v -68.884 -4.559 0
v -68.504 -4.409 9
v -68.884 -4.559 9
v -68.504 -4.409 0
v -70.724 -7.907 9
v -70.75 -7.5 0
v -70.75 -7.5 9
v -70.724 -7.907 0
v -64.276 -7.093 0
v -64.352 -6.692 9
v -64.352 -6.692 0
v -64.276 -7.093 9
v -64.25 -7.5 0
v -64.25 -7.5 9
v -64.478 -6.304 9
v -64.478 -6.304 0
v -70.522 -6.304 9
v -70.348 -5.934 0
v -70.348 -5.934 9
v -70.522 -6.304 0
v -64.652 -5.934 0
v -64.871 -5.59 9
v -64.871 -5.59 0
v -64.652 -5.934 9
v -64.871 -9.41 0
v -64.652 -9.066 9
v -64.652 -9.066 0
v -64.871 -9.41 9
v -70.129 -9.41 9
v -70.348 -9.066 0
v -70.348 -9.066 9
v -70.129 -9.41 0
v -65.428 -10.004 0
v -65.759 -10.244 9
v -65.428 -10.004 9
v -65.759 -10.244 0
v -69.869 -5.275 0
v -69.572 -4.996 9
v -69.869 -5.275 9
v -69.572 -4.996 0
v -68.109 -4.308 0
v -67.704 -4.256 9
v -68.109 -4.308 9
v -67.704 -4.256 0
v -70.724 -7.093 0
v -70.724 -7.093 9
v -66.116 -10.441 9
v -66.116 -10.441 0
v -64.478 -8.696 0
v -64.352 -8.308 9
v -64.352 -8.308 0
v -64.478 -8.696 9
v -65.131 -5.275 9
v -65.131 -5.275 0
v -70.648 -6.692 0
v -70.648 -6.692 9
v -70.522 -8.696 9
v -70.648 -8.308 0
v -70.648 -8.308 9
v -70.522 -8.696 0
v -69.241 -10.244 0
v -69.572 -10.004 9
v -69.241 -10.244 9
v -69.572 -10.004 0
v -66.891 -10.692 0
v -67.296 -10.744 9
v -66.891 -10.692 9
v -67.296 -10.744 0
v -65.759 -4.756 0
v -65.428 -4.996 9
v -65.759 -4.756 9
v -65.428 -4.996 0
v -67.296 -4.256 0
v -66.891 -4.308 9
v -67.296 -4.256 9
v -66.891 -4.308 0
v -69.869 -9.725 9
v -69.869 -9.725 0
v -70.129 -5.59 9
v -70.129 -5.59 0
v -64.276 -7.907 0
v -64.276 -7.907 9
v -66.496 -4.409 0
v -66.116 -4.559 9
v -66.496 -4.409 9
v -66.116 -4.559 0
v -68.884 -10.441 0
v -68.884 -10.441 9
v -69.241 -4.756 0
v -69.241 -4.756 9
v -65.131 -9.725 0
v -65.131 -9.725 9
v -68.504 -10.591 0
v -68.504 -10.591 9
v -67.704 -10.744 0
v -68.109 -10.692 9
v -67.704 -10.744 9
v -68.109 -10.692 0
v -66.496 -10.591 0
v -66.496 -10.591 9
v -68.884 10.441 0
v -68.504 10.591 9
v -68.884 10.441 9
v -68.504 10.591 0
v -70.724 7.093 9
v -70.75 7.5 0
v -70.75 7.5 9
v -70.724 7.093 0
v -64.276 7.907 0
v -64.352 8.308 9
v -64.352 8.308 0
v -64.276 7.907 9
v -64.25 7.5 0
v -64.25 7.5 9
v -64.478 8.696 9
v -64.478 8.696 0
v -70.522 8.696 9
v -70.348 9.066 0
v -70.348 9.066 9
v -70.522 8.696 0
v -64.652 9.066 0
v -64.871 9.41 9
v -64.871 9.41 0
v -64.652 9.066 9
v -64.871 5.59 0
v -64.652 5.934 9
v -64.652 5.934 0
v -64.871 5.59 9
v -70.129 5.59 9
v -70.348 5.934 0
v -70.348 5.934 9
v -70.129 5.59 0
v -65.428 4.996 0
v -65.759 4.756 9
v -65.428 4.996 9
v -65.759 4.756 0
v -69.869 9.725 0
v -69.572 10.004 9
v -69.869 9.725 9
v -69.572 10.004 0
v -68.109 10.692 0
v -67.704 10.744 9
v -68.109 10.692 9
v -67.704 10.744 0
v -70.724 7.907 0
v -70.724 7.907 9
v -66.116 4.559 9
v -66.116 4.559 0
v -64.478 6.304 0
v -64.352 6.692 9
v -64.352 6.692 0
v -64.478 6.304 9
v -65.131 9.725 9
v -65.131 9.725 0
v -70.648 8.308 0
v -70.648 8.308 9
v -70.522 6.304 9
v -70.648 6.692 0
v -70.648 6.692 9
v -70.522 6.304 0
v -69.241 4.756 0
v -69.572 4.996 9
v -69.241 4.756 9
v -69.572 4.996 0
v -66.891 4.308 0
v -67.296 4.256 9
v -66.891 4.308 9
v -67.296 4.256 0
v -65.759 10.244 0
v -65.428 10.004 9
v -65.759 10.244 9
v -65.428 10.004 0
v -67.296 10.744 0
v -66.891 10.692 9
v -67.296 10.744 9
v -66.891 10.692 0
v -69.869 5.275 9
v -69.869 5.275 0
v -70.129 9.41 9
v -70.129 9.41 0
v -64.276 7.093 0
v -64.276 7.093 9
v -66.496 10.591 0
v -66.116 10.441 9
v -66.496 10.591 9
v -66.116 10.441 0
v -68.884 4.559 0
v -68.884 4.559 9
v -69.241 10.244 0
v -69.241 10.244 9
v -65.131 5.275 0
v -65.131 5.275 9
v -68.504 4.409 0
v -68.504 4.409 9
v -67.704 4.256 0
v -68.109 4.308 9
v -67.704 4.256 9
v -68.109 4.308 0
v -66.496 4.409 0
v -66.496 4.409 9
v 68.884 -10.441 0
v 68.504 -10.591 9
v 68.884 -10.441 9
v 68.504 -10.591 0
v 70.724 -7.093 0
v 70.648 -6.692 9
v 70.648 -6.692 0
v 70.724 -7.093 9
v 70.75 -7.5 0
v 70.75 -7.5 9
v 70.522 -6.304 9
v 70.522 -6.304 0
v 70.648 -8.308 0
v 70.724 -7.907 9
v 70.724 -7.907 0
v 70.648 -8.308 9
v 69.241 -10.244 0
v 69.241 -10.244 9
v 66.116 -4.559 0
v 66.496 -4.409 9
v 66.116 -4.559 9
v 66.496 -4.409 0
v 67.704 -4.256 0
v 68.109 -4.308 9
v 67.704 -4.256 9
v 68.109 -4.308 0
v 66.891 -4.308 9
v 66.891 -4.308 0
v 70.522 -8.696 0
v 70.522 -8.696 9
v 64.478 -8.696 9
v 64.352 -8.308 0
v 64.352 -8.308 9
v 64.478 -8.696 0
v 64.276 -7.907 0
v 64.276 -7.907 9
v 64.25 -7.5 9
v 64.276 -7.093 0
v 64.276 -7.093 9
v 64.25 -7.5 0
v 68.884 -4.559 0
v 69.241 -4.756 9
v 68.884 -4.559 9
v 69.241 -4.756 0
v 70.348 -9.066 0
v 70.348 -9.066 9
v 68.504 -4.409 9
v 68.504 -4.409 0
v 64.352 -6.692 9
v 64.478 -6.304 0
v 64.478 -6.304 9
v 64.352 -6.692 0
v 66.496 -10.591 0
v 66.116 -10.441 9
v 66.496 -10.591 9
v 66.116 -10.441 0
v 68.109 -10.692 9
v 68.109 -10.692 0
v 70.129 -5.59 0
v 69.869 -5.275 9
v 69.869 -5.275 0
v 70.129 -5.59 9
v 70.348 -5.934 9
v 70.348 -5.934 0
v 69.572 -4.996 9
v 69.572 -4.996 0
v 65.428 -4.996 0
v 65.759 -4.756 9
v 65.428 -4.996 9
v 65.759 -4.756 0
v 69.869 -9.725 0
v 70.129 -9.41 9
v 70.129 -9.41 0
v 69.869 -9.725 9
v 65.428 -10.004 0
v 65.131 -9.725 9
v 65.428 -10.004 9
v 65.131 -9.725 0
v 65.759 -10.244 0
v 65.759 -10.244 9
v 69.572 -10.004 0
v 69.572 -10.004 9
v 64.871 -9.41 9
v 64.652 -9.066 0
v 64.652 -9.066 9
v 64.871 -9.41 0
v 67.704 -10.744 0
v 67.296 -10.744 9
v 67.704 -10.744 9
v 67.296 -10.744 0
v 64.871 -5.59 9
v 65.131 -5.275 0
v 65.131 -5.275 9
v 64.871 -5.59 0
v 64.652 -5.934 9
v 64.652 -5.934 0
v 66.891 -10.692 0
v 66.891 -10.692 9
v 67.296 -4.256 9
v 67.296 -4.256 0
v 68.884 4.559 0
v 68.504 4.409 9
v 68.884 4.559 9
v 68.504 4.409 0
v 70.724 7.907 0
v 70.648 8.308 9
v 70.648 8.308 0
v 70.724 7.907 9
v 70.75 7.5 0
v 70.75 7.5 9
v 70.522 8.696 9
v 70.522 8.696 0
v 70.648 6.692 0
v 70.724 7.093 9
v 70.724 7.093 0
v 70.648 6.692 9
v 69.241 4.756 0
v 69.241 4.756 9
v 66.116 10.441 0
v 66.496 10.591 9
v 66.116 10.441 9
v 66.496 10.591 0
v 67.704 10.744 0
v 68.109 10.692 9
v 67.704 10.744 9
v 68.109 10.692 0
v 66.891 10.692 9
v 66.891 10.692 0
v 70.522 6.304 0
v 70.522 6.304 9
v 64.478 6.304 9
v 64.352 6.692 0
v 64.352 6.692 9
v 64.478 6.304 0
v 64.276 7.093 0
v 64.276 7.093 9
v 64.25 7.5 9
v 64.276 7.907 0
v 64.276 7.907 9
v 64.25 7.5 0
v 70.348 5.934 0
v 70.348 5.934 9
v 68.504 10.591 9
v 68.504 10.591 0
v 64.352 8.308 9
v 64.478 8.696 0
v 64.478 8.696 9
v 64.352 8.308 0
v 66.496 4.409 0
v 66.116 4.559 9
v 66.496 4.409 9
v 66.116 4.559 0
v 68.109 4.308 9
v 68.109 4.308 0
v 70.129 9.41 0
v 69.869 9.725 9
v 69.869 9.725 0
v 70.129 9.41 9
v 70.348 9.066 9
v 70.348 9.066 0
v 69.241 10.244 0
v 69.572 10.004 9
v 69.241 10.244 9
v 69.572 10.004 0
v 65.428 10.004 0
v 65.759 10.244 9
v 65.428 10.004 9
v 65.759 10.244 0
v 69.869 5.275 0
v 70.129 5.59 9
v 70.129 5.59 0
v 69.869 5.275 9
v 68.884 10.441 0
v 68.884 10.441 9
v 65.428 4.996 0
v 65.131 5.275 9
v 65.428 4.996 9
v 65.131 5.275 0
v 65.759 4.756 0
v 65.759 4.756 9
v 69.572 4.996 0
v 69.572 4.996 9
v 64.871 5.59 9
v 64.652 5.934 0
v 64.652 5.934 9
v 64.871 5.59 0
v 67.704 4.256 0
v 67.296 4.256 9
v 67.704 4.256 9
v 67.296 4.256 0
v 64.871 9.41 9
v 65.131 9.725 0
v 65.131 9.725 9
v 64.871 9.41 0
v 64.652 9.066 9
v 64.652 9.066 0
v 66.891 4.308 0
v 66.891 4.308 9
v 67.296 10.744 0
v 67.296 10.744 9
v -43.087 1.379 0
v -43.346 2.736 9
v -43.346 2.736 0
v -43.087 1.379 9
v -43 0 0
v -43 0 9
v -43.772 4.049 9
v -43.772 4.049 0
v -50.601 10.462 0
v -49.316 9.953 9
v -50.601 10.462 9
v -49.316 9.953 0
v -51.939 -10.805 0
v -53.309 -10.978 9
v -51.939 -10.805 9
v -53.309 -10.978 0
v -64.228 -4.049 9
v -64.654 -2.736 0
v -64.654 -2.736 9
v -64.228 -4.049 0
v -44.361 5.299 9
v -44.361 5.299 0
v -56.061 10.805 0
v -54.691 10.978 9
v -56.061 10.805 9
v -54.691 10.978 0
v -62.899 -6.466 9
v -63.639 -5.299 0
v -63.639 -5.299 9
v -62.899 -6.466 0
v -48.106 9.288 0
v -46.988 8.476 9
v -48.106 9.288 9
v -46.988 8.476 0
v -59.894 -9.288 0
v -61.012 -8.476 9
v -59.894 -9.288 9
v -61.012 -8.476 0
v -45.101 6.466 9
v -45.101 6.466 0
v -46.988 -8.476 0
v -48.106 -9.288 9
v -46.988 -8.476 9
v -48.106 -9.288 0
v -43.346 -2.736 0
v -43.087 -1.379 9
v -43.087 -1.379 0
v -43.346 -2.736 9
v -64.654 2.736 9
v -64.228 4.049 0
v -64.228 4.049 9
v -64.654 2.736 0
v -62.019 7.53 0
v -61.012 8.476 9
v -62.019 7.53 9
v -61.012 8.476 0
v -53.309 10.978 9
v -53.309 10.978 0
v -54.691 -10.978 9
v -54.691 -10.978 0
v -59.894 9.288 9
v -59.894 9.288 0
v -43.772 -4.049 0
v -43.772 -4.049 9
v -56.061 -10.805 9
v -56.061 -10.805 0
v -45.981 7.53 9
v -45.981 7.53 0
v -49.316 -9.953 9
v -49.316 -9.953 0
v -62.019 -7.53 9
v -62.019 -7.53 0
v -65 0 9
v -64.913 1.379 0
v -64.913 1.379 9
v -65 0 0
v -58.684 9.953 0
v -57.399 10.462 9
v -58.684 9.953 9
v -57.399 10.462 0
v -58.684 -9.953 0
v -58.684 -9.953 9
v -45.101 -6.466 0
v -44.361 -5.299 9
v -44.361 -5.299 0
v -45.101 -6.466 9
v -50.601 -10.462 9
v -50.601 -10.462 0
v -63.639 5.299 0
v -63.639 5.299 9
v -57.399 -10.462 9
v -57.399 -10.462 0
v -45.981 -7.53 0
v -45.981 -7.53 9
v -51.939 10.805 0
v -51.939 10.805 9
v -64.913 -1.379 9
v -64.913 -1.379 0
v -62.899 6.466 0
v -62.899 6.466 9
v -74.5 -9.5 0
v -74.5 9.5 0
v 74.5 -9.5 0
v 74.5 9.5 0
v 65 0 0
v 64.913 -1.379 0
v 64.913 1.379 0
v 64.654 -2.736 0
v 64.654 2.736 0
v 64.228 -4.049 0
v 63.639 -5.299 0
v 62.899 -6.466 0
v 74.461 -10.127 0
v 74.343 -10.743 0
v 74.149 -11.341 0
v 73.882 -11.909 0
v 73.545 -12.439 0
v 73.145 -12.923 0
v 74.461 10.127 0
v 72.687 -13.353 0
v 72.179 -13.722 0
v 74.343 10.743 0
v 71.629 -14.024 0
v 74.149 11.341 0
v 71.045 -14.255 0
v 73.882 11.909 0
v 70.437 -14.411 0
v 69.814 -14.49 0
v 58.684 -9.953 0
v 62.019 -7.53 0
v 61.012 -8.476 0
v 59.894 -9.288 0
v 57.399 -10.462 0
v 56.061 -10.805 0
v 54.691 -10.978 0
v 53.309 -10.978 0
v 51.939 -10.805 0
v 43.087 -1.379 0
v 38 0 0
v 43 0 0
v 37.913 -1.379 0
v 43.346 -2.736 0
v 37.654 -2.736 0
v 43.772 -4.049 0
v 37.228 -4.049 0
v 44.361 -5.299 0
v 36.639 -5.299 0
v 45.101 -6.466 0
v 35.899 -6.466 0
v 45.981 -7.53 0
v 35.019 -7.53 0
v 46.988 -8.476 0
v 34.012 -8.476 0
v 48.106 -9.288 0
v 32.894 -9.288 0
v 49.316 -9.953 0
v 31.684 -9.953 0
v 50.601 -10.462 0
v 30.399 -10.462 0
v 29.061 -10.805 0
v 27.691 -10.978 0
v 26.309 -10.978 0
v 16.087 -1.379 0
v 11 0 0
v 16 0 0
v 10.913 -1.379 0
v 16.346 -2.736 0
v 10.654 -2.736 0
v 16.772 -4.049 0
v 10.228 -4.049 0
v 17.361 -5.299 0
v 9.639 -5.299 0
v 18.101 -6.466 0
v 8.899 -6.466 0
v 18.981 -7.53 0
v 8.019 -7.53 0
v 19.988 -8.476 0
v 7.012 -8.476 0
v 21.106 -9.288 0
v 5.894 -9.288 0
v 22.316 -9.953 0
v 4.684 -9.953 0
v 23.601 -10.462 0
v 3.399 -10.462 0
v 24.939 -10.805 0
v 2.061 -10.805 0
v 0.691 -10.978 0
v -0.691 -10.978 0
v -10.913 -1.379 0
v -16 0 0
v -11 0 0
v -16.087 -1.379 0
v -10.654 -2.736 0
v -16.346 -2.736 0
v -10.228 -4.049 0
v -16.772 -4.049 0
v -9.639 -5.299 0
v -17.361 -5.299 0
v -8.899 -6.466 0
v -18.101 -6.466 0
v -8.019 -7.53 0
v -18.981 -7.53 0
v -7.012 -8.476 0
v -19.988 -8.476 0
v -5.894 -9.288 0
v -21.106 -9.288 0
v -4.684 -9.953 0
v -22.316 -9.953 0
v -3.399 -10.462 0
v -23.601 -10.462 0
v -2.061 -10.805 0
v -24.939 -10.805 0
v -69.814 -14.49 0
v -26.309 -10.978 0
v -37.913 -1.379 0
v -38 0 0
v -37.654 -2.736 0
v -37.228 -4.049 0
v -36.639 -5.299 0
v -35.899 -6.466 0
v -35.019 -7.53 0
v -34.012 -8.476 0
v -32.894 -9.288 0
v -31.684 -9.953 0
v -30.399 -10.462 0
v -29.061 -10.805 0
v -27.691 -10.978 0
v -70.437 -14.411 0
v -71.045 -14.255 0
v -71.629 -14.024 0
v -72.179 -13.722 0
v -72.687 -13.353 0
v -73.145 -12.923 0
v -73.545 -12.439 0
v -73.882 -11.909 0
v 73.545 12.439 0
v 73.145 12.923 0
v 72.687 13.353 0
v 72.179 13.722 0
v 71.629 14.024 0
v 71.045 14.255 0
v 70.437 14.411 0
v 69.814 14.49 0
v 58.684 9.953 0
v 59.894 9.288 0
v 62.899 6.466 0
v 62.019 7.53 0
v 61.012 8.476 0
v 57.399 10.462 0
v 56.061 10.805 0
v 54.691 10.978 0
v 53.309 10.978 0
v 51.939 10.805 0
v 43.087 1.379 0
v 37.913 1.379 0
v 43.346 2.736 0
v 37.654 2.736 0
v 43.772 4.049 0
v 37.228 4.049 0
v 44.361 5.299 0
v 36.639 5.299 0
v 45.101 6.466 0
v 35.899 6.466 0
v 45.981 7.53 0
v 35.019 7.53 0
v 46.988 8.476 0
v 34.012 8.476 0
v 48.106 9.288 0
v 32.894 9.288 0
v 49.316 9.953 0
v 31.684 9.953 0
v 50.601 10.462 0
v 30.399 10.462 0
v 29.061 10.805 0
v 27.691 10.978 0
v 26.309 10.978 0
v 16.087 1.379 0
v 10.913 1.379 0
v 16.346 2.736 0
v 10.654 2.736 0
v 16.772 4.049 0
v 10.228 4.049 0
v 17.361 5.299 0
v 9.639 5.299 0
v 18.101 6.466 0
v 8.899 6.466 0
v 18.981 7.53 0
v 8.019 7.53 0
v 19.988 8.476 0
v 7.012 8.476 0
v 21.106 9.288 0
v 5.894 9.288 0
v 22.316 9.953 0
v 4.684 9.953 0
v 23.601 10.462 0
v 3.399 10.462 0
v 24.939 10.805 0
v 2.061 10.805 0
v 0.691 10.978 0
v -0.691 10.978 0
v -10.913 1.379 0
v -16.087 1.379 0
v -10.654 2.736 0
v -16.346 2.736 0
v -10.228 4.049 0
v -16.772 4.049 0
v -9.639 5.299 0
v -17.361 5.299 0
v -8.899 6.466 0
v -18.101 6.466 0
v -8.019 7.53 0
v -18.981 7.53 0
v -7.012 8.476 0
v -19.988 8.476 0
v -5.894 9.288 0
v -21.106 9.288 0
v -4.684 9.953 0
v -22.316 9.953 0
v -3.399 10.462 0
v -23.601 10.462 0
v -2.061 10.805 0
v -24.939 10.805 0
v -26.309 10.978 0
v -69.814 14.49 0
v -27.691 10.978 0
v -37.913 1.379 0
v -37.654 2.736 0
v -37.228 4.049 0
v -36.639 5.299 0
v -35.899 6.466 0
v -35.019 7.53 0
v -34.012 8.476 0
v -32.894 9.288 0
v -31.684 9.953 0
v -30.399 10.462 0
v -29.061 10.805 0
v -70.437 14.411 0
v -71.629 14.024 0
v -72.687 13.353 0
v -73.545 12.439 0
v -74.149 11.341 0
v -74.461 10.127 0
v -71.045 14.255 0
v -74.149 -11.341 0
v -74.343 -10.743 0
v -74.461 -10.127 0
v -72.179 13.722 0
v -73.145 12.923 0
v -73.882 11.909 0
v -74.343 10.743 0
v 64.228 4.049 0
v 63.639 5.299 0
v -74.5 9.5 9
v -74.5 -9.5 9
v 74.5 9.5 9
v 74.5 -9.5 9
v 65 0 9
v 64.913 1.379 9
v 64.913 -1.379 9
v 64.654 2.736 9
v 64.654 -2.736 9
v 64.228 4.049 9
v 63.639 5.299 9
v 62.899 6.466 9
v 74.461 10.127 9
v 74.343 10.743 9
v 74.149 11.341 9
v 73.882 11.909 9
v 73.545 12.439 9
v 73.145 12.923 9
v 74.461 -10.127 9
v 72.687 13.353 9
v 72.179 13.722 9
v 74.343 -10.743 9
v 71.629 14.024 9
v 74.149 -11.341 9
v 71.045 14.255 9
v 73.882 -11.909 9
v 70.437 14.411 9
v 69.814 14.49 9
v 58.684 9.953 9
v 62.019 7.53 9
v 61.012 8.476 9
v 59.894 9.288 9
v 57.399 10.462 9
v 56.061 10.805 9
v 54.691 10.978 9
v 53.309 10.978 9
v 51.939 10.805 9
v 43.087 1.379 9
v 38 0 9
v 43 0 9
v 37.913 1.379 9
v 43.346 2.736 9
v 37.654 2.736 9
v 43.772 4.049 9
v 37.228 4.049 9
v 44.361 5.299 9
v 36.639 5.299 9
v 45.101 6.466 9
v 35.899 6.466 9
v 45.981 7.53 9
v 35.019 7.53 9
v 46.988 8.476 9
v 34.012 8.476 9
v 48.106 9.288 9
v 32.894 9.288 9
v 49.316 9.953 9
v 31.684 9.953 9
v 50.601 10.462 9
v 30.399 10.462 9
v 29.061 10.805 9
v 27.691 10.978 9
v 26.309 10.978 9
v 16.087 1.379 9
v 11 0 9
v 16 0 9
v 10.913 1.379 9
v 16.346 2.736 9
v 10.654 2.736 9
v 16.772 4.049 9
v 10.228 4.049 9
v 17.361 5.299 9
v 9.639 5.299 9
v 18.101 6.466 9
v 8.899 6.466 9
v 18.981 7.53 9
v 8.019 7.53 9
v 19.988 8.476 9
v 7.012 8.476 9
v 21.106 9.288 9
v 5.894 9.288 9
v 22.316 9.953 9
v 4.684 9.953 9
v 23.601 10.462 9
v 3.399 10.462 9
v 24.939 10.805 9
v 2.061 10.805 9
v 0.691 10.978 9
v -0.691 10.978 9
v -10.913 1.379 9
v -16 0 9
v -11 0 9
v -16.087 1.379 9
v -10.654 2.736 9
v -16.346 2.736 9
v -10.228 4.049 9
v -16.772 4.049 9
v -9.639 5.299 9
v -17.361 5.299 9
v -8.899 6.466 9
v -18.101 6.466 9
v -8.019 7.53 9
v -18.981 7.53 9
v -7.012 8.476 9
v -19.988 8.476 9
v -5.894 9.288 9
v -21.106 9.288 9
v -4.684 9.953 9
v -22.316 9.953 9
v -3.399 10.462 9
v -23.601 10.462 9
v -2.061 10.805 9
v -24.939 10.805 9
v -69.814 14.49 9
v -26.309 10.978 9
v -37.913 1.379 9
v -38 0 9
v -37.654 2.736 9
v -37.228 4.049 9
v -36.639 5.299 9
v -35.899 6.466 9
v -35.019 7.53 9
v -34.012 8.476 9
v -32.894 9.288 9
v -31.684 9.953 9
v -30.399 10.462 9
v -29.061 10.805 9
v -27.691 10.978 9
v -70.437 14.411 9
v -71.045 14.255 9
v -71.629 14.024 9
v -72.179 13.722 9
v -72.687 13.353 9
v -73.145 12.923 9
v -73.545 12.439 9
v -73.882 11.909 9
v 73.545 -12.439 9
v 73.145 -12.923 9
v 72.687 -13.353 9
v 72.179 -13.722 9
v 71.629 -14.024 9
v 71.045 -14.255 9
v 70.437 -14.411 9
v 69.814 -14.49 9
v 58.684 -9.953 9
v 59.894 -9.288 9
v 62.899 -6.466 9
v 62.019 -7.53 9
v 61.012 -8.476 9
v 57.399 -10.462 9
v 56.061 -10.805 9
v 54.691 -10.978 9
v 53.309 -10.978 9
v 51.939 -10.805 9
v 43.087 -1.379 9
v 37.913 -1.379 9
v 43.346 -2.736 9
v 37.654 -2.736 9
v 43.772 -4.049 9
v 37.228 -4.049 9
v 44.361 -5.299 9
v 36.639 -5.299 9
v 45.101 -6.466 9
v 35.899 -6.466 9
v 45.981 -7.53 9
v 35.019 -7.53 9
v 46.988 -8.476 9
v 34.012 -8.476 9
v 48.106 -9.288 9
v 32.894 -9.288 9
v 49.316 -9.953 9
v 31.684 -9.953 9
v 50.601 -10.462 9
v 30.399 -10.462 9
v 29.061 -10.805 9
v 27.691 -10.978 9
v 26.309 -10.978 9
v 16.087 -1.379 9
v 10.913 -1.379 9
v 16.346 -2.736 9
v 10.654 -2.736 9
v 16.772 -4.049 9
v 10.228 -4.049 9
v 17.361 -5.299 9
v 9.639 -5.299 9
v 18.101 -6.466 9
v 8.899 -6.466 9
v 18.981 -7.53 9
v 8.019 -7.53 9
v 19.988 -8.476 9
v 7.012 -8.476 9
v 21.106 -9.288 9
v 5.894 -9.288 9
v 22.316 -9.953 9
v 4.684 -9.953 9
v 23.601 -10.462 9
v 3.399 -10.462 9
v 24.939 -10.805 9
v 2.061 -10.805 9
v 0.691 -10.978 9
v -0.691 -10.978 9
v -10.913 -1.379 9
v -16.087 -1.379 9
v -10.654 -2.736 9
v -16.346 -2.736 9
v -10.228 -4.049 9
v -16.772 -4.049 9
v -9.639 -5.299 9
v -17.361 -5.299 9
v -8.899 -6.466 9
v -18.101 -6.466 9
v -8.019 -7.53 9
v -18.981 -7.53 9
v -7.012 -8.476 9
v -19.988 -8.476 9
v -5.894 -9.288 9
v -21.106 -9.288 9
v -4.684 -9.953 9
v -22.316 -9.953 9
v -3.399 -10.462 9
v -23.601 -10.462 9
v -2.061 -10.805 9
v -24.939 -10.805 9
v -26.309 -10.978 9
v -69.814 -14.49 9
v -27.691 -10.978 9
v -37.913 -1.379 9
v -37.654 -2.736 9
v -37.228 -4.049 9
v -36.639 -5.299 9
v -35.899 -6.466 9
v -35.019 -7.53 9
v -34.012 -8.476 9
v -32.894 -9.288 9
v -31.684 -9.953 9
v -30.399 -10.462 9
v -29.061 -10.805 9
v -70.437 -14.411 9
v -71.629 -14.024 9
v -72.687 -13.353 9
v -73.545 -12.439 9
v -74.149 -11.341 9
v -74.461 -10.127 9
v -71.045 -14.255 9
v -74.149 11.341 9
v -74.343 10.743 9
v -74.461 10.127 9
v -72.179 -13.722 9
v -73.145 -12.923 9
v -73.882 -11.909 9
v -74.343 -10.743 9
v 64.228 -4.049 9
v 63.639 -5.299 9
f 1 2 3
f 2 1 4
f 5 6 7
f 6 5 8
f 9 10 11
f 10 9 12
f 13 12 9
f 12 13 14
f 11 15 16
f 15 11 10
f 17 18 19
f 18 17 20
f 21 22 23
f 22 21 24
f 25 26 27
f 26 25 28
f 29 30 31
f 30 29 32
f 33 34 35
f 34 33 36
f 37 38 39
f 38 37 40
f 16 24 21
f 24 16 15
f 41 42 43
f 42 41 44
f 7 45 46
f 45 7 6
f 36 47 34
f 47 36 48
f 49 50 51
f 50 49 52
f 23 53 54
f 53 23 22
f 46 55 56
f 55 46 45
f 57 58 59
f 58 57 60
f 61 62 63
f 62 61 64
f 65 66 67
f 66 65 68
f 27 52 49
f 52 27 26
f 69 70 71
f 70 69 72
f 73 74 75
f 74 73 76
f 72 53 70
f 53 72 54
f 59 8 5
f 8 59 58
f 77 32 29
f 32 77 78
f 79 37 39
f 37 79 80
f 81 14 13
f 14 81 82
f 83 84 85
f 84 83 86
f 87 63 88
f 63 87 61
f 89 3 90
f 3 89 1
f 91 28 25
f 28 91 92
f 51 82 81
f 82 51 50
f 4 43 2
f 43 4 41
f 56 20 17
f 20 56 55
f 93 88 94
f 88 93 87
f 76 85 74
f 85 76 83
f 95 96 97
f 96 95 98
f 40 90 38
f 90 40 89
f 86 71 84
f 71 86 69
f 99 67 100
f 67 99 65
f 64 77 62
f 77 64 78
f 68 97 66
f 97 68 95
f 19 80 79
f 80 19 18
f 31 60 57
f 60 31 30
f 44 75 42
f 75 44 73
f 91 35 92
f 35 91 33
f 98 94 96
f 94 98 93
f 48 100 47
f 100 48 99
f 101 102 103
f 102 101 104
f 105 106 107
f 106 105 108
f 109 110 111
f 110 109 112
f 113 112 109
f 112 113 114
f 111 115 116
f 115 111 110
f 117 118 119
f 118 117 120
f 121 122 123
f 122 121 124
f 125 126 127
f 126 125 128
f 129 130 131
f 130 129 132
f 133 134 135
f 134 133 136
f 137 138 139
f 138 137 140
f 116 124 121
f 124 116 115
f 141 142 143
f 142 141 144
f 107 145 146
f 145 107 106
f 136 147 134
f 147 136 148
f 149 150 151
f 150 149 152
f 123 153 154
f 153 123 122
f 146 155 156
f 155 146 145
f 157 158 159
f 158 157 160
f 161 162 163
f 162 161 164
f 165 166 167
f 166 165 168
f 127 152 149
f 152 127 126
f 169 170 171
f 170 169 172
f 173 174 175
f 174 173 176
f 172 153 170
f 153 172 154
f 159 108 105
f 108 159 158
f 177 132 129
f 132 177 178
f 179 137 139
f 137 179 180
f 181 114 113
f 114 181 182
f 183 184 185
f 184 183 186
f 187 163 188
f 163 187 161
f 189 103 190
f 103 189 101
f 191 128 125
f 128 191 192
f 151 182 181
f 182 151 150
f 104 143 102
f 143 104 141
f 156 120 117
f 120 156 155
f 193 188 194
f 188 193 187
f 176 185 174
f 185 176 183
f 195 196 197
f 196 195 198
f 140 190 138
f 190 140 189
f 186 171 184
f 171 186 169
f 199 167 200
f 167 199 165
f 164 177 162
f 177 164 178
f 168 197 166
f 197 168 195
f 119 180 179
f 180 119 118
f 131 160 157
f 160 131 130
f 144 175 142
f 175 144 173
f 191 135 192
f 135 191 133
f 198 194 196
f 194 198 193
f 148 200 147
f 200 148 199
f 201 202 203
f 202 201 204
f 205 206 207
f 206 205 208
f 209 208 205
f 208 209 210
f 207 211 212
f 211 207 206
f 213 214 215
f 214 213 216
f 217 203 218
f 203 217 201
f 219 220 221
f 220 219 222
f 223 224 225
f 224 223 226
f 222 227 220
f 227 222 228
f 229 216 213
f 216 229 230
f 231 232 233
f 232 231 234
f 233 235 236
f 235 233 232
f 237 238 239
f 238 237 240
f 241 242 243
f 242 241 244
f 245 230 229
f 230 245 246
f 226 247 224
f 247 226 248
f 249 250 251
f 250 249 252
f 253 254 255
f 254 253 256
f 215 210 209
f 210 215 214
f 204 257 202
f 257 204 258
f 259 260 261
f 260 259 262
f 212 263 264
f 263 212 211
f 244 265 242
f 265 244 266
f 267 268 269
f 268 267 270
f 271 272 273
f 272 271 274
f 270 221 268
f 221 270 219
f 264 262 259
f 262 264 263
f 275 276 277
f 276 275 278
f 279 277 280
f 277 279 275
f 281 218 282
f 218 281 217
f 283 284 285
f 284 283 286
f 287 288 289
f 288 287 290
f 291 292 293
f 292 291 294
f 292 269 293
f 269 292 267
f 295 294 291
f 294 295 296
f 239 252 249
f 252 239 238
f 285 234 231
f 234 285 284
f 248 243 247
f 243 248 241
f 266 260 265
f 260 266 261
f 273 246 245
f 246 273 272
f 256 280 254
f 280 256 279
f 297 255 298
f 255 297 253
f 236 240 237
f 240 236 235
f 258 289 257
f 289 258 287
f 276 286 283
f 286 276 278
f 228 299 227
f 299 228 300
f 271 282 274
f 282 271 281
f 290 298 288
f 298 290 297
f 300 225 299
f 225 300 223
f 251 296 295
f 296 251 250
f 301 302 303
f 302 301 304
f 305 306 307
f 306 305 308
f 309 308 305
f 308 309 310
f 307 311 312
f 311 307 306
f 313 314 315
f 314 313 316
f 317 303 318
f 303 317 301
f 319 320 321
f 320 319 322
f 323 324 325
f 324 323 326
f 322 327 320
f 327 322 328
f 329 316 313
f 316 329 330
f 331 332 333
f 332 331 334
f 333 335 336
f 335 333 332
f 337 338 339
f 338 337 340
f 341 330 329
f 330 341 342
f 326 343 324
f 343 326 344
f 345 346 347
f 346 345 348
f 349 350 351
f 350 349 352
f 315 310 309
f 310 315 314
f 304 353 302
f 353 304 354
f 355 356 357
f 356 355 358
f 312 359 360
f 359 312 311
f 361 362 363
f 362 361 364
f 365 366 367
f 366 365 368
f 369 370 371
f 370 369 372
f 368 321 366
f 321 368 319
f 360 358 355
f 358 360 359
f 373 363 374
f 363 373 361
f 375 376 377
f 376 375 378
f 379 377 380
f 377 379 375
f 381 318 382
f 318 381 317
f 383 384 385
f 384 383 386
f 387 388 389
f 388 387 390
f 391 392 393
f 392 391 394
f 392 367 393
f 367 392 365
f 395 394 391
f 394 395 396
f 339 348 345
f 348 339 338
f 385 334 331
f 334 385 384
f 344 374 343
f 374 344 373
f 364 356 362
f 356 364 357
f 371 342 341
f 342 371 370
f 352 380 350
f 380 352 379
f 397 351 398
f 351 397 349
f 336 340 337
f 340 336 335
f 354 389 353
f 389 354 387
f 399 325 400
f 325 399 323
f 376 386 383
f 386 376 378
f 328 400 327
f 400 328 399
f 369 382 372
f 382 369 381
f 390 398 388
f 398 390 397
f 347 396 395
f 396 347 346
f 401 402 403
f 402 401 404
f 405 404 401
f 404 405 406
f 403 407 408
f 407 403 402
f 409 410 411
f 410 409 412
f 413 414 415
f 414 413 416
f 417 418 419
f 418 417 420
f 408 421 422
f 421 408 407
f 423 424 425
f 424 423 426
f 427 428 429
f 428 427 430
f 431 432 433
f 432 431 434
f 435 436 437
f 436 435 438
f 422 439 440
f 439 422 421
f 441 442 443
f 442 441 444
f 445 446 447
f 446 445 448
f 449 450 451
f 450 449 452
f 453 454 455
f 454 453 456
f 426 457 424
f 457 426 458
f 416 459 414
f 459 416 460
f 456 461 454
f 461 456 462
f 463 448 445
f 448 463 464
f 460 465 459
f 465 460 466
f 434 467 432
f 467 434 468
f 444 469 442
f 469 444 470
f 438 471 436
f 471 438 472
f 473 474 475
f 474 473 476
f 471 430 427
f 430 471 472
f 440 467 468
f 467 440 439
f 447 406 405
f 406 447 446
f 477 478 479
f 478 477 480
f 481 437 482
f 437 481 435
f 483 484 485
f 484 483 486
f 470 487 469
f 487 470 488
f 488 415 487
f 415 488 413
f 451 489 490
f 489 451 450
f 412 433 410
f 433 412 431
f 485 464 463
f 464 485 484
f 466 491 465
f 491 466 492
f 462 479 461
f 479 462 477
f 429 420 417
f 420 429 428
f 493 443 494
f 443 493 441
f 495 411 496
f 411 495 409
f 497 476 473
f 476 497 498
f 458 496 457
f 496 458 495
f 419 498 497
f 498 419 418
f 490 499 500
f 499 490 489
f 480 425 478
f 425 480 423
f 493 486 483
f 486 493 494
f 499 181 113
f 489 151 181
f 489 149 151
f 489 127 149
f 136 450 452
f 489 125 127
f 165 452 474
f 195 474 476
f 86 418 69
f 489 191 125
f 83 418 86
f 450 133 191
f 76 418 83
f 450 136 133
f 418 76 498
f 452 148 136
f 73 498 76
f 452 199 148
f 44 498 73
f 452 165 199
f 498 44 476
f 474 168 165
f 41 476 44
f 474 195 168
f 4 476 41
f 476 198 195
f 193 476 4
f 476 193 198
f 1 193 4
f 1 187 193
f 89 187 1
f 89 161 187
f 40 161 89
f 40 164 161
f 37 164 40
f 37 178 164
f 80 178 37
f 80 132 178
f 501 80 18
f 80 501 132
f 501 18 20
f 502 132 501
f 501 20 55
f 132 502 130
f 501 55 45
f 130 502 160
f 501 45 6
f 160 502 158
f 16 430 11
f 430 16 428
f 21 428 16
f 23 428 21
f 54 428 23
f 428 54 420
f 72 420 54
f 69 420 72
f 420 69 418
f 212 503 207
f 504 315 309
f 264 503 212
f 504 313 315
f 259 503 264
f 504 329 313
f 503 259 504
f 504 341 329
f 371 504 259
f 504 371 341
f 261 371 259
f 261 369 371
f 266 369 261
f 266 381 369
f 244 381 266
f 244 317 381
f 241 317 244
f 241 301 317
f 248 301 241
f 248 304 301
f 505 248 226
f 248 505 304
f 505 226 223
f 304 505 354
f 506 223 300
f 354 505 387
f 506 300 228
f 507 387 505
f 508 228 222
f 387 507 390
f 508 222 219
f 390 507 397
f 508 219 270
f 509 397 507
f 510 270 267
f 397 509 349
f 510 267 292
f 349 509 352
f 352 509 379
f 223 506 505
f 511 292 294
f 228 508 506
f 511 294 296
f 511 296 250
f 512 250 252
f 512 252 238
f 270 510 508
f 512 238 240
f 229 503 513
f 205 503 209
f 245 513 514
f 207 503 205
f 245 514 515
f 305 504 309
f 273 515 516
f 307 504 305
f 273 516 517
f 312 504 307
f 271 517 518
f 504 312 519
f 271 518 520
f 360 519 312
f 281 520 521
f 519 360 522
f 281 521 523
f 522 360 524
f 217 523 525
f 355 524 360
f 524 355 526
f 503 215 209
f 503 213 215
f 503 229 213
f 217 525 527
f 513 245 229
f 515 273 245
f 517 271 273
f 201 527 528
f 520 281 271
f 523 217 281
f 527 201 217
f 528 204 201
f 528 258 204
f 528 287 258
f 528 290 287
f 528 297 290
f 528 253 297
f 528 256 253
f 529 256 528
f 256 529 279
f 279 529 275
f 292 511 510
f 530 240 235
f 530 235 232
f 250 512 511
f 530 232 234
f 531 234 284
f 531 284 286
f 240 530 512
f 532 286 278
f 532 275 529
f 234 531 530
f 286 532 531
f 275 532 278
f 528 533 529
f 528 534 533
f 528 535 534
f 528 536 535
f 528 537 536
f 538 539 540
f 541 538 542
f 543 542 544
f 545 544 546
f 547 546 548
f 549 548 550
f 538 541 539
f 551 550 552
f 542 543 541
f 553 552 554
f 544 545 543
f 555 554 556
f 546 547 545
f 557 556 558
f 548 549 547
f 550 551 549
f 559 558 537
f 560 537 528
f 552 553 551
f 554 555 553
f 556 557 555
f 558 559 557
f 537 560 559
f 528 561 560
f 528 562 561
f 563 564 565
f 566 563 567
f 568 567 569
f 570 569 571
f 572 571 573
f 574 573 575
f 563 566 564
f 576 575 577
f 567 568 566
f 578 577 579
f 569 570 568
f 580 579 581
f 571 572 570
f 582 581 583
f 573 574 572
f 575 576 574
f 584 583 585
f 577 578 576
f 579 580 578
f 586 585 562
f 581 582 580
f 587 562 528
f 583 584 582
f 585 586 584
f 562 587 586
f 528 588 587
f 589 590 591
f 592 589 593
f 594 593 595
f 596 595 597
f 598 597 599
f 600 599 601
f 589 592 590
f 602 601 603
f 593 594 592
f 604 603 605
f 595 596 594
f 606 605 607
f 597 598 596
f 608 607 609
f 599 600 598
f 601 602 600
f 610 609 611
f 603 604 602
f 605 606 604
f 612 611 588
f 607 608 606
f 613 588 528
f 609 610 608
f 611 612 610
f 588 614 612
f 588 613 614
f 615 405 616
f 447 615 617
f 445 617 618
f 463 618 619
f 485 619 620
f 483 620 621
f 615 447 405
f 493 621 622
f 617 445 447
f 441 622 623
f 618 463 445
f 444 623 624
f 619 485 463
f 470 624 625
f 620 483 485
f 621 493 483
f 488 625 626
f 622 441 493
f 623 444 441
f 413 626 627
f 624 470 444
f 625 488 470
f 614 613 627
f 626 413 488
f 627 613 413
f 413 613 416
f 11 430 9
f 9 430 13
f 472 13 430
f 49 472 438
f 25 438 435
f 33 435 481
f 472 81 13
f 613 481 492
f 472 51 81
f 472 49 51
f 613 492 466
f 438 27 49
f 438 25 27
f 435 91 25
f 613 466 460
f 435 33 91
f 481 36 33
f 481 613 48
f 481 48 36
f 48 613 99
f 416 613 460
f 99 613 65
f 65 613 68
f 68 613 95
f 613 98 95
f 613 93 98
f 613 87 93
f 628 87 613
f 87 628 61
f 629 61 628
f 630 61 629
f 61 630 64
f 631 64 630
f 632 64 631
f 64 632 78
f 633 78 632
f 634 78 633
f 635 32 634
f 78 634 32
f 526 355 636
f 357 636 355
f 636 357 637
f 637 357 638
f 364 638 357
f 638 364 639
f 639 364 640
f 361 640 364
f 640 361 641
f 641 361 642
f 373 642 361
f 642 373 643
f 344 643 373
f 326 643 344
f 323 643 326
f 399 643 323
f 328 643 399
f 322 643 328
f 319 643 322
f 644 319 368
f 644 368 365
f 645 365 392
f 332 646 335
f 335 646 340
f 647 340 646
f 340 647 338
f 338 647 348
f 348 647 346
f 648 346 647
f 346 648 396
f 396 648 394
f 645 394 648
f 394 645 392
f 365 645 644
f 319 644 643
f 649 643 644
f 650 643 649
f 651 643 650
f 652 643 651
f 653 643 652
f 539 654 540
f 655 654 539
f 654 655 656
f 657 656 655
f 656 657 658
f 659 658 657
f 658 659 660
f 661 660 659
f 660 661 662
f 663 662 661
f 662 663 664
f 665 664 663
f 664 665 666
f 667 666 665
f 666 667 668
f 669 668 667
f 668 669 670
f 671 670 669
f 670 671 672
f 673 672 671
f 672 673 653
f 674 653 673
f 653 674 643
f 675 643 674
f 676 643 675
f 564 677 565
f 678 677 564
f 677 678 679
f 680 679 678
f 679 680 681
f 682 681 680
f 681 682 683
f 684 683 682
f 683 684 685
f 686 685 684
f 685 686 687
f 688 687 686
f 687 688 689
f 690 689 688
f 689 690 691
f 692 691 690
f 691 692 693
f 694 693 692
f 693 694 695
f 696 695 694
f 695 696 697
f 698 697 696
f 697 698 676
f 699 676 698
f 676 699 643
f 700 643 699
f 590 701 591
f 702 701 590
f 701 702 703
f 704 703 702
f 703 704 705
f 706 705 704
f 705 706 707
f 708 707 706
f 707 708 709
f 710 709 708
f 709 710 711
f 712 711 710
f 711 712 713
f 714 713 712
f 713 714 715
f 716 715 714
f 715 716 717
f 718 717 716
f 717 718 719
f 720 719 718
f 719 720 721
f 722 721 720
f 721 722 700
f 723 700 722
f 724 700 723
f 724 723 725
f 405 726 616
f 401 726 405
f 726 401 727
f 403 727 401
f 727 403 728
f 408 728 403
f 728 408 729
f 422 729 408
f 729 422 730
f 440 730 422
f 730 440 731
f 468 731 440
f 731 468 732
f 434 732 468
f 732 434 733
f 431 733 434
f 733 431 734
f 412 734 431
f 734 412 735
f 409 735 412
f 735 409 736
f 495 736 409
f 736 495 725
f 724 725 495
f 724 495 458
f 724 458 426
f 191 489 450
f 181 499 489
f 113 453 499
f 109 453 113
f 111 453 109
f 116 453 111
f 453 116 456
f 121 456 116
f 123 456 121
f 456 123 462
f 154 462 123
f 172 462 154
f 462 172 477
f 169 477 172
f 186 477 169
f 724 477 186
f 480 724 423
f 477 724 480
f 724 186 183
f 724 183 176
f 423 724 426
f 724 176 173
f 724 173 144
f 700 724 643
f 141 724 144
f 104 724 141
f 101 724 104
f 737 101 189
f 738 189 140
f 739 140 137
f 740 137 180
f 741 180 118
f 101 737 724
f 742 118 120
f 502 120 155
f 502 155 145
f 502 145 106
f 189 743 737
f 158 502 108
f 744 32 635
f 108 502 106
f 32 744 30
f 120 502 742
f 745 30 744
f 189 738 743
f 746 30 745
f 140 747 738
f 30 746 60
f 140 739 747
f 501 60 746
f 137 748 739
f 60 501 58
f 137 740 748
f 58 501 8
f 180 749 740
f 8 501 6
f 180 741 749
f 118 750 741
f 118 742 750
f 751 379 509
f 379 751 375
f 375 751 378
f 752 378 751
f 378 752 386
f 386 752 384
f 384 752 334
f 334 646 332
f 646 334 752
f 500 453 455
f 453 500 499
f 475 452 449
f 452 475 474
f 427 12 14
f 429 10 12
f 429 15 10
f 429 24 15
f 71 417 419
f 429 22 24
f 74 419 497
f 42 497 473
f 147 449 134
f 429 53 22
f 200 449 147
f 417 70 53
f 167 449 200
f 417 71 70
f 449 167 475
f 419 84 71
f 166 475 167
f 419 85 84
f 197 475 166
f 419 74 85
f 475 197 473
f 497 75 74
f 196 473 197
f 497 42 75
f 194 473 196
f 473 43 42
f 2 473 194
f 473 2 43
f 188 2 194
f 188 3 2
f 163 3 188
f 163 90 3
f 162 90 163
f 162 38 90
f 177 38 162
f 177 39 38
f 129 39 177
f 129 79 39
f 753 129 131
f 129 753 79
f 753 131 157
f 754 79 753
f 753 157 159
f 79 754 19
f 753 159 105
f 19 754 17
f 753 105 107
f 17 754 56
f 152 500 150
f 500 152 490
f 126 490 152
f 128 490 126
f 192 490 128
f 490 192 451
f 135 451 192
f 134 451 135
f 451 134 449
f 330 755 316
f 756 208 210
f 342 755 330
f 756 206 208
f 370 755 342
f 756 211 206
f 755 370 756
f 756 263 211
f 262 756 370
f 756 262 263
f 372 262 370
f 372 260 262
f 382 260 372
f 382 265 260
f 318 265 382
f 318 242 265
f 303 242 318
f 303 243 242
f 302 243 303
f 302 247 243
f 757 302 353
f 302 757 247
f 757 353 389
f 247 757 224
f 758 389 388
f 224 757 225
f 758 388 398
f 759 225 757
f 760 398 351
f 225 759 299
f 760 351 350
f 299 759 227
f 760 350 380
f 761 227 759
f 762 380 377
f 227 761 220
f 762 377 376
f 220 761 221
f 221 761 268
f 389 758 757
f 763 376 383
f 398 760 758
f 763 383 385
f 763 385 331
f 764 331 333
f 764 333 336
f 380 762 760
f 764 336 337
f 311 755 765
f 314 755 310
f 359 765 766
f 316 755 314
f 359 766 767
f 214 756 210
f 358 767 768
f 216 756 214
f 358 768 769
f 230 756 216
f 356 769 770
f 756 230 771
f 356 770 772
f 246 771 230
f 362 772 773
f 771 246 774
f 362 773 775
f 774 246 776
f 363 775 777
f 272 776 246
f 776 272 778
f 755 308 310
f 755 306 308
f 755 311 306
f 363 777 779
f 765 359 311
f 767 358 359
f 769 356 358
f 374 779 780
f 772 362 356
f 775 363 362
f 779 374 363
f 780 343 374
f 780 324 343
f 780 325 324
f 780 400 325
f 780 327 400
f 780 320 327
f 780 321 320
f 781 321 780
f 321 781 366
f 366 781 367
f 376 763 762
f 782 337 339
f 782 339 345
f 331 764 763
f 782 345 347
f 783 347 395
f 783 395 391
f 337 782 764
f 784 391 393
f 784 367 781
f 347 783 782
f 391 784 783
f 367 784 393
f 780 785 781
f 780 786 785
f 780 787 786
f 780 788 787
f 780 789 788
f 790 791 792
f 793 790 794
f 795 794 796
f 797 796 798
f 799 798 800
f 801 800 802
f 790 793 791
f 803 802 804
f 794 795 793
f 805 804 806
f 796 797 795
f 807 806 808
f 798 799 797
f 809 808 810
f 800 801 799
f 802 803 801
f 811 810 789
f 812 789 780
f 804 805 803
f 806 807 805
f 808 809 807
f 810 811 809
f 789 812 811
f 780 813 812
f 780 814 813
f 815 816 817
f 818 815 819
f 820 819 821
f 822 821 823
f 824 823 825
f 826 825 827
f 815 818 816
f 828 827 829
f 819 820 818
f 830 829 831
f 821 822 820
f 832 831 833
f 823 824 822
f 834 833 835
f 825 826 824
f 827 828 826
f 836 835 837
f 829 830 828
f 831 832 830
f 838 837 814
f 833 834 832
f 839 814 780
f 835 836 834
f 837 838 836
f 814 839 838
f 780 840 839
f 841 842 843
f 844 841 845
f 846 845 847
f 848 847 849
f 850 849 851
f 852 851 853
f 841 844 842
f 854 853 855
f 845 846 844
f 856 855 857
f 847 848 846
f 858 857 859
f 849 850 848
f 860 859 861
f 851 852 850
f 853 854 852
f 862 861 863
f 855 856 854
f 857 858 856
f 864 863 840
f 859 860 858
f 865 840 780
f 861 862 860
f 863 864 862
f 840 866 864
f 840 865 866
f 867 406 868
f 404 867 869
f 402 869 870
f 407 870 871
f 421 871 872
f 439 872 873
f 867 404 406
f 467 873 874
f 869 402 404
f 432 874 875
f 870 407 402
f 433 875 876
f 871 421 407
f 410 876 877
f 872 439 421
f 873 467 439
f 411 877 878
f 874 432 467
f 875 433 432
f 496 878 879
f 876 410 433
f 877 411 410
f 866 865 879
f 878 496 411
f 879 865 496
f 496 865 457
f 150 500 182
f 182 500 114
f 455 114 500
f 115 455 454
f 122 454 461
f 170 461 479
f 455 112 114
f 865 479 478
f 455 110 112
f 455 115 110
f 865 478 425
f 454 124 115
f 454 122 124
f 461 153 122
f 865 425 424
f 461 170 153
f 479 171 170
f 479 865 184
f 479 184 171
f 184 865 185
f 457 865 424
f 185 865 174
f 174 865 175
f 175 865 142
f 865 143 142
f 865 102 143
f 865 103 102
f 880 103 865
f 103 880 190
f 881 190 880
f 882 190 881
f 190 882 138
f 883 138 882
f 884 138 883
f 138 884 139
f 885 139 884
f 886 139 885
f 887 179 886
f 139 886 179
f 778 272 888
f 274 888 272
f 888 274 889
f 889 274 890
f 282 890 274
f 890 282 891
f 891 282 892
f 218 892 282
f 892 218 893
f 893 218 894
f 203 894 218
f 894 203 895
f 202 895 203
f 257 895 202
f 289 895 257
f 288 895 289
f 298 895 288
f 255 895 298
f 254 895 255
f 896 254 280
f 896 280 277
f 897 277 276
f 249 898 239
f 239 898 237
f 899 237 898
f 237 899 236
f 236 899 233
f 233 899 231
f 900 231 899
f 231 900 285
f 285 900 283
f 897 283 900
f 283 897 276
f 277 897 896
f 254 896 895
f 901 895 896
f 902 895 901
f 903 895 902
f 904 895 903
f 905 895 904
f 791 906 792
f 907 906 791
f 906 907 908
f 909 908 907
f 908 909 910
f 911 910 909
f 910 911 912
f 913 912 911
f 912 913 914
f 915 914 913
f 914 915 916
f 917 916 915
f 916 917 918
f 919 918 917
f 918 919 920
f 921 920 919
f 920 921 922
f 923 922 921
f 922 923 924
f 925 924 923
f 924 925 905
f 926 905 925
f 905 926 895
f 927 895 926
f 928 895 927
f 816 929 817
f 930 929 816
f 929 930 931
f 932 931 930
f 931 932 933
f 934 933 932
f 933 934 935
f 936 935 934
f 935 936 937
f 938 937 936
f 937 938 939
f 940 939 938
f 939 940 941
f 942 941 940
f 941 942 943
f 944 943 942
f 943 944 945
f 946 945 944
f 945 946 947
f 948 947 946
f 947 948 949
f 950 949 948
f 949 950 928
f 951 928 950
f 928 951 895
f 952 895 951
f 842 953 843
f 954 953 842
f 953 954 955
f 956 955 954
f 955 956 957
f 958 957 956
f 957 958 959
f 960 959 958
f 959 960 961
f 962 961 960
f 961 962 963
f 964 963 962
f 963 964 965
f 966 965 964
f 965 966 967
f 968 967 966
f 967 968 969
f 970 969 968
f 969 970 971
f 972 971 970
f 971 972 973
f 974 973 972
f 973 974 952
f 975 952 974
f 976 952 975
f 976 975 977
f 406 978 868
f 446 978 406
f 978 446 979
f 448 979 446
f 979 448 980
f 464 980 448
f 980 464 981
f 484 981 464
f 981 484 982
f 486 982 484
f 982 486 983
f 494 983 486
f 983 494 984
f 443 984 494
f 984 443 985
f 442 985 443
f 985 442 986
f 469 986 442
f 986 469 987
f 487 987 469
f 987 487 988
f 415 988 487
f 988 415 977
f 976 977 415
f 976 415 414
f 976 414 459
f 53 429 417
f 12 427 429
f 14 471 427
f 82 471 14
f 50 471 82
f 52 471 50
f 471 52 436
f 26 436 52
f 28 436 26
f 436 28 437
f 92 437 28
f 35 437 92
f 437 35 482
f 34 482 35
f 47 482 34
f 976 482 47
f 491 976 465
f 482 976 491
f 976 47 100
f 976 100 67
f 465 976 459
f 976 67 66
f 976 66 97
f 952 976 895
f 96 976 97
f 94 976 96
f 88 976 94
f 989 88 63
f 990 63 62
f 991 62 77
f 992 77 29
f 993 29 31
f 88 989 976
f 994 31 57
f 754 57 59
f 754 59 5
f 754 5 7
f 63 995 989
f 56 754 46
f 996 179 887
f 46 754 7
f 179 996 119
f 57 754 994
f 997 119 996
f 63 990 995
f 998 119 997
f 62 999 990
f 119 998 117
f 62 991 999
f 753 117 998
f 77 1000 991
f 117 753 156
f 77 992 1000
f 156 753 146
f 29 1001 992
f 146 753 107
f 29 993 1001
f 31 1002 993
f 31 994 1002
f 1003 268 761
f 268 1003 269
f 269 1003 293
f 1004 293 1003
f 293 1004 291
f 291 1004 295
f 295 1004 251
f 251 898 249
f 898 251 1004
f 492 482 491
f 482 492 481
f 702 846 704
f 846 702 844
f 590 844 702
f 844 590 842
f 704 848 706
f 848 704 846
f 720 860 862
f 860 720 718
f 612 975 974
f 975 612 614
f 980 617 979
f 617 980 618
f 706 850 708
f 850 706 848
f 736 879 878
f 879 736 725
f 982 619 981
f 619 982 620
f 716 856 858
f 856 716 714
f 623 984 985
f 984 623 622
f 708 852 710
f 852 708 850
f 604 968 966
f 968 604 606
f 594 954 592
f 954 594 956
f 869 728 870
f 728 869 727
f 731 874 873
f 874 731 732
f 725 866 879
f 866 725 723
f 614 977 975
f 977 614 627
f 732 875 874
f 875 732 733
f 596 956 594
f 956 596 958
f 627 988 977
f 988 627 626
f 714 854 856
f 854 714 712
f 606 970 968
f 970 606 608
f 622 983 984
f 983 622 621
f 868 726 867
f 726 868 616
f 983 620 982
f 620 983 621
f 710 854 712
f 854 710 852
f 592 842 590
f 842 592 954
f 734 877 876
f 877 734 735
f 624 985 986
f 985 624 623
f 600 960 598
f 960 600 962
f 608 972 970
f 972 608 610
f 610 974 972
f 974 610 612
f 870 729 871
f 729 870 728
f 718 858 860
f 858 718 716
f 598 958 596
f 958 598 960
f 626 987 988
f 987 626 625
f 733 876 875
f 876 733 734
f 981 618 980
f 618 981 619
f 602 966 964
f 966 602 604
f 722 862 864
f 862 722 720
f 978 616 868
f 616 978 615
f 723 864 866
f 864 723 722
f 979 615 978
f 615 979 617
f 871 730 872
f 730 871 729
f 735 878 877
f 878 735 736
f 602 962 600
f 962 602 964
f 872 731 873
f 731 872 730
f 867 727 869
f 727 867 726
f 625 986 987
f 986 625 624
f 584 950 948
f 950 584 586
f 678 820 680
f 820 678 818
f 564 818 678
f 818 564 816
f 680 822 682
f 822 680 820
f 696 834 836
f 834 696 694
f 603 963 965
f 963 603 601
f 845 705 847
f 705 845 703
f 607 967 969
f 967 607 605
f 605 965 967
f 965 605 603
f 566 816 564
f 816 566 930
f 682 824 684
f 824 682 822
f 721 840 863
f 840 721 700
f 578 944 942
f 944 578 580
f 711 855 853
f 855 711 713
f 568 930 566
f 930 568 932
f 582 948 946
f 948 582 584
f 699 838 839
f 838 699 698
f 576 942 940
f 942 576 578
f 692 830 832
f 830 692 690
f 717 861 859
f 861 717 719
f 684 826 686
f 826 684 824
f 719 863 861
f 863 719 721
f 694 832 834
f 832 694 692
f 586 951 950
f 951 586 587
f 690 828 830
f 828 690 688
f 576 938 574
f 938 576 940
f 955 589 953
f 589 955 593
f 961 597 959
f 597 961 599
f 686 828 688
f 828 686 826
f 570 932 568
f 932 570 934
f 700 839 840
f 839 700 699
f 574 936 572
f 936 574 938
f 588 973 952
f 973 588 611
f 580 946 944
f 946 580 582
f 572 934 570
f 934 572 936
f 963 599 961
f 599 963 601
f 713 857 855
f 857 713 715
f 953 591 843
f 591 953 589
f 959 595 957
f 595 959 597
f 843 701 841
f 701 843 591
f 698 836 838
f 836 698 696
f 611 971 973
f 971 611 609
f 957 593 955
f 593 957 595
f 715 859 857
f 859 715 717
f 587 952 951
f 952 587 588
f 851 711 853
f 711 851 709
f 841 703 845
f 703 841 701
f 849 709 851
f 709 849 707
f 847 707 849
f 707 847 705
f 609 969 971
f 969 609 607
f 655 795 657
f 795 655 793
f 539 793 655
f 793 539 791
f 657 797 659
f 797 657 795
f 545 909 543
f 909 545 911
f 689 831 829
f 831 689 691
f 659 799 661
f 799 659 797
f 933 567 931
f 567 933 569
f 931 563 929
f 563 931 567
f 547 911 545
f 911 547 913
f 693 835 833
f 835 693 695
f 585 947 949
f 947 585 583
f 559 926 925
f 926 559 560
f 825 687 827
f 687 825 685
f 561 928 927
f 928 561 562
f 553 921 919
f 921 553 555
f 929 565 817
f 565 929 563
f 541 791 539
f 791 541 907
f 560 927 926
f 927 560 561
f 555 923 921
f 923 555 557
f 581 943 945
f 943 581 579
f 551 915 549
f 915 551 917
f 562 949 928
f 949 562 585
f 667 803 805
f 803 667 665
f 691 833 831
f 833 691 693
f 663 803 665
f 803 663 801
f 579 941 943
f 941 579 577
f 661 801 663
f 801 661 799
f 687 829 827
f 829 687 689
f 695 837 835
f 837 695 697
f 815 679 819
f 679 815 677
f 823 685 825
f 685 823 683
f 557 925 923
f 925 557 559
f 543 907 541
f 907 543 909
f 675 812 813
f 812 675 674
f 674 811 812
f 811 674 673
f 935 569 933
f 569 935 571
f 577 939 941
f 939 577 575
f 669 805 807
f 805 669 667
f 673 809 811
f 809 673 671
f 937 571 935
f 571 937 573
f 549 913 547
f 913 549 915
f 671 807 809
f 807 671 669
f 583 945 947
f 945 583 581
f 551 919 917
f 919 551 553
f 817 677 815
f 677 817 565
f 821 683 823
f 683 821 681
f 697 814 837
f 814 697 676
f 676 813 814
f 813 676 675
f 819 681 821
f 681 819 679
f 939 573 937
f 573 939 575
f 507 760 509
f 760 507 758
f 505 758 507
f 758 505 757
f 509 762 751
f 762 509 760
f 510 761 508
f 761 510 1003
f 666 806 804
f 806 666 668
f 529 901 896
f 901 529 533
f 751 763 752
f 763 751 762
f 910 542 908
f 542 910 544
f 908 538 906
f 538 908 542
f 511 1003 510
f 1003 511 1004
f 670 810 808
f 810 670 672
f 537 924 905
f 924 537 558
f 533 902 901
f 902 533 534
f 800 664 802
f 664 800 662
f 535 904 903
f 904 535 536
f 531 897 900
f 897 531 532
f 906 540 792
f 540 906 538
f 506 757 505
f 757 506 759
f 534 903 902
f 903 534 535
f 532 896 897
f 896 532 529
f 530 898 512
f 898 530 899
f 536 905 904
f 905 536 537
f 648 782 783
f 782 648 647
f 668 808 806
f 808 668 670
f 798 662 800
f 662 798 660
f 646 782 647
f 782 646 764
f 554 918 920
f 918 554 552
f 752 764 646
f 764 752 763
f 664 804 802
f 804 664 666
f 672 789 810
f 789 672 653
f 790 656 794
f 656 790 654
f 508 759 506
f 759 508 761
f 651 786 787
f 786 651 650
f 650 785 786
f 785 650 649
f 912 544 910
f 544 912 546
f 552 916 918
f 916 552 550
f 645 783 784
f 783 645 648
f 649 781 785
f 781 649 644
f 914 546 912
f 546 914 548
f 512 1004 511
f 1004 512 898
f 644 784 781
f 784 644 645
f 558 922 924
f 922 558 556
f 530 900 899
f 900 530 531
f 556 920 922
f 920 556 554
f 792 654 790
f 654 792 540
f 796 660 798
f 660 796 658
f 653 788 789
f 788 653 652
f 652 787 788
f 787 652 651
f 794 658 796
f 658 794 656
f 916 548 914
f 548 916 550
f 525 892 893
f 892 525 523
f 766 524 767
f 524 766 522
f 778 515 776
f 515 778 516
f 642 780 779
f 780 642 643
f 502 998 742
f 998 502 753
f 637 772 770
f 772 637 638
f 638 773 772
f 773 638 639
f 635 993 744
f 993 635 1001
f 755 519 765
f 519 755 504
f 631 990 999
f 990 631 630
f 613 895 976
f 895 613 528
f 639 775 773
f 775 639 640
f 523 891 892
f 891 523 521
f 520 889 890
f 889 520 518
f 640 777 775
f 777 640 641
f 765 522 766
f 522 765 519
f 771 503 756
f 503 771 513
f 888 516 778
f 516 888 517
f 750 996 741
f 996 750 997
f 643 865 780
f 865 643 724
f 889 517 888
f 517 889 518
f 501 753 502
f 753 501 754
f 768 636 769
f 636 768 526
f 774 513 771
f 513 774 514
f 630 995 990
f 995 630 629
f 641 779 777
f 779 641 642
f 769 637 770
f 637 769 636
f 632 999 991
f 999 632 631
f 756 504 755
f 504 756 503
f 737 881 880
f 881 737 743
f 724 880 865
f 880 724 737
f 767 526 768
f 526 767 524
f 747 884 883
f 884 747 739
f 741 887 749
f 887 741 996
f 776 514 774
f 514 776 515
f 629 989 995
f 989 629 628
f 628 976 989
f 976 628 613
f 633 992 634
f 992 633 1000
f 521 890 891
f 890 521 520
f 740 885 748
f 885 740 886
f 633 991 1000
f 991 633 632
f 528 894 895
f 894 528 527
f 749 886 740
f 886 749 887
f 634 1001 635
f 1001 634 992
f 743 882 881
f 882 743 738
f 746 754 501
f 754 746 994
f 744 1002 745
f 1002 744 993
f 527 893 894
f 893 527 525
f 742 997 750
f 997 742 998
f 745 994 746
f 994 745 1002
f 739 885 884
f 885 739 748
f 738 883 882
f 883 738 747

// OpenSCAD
$fn = 50;


difference() {
	union() {
		hull() {
			translate(v = [-69.5000000000, 9.5000000000, 0]) {
				cylinder(h = 9, r = 5);
			}
			translate(v = [69.5000000000, 9.5000000000, 0]) {
				cylinder(h = 9, r = 5);
			}
			translate(v = [-69.5000000000, -9.5000000000, 0]) {
				cylinder(h = 9, r = 5);
			}
			translate(v = [69.5000000000, -9.5000000000, 0]) {
				cylinder(h = 9, r = 5);
			}
		}
	}
	union() {
		#translate(v = [-67.5000000000, -7.5000000000, -100.0000000000]) {
			cylinder(h = 200, r = 3.2500000000);
		}
		#translate(v = [-67.5000000000, 7.5000000000, -100.0000000000]) {
			cylinder(h = 200, r = 3.2500000000);
		}
		#translate(v = [67.5000000000, -7.5000000000, -100.0000000000]) {
			cylinder(h = 200, r = 3.2500000000);
		}
		#translate(v = [67.5000000000, 7.5000000000, -100.0000000000]) {
			cylinder(h = 200, r = 3.2500000000);
		}
		#translate(v = [-54.0000000000, 0, 0]) {
			cylinder(h = 9, r = 11.0000000000);
		}
		#translate(v = [-27.0000000000, 0, 0]) {
			cylinder(h = 9, r = 11.0000000000);
		}
		#cylinder(h = 9, r = 11.0000000000);
		#translate(v = [27.0000000000, 0, 0]) {
			cylinder(h = 9, r = 11.0000000000);
		}
		#translate(v = [54.0000000000, 0, 0]) {
			cylinder(h = 9, r = 11.0000000000);
		}
	}
}
